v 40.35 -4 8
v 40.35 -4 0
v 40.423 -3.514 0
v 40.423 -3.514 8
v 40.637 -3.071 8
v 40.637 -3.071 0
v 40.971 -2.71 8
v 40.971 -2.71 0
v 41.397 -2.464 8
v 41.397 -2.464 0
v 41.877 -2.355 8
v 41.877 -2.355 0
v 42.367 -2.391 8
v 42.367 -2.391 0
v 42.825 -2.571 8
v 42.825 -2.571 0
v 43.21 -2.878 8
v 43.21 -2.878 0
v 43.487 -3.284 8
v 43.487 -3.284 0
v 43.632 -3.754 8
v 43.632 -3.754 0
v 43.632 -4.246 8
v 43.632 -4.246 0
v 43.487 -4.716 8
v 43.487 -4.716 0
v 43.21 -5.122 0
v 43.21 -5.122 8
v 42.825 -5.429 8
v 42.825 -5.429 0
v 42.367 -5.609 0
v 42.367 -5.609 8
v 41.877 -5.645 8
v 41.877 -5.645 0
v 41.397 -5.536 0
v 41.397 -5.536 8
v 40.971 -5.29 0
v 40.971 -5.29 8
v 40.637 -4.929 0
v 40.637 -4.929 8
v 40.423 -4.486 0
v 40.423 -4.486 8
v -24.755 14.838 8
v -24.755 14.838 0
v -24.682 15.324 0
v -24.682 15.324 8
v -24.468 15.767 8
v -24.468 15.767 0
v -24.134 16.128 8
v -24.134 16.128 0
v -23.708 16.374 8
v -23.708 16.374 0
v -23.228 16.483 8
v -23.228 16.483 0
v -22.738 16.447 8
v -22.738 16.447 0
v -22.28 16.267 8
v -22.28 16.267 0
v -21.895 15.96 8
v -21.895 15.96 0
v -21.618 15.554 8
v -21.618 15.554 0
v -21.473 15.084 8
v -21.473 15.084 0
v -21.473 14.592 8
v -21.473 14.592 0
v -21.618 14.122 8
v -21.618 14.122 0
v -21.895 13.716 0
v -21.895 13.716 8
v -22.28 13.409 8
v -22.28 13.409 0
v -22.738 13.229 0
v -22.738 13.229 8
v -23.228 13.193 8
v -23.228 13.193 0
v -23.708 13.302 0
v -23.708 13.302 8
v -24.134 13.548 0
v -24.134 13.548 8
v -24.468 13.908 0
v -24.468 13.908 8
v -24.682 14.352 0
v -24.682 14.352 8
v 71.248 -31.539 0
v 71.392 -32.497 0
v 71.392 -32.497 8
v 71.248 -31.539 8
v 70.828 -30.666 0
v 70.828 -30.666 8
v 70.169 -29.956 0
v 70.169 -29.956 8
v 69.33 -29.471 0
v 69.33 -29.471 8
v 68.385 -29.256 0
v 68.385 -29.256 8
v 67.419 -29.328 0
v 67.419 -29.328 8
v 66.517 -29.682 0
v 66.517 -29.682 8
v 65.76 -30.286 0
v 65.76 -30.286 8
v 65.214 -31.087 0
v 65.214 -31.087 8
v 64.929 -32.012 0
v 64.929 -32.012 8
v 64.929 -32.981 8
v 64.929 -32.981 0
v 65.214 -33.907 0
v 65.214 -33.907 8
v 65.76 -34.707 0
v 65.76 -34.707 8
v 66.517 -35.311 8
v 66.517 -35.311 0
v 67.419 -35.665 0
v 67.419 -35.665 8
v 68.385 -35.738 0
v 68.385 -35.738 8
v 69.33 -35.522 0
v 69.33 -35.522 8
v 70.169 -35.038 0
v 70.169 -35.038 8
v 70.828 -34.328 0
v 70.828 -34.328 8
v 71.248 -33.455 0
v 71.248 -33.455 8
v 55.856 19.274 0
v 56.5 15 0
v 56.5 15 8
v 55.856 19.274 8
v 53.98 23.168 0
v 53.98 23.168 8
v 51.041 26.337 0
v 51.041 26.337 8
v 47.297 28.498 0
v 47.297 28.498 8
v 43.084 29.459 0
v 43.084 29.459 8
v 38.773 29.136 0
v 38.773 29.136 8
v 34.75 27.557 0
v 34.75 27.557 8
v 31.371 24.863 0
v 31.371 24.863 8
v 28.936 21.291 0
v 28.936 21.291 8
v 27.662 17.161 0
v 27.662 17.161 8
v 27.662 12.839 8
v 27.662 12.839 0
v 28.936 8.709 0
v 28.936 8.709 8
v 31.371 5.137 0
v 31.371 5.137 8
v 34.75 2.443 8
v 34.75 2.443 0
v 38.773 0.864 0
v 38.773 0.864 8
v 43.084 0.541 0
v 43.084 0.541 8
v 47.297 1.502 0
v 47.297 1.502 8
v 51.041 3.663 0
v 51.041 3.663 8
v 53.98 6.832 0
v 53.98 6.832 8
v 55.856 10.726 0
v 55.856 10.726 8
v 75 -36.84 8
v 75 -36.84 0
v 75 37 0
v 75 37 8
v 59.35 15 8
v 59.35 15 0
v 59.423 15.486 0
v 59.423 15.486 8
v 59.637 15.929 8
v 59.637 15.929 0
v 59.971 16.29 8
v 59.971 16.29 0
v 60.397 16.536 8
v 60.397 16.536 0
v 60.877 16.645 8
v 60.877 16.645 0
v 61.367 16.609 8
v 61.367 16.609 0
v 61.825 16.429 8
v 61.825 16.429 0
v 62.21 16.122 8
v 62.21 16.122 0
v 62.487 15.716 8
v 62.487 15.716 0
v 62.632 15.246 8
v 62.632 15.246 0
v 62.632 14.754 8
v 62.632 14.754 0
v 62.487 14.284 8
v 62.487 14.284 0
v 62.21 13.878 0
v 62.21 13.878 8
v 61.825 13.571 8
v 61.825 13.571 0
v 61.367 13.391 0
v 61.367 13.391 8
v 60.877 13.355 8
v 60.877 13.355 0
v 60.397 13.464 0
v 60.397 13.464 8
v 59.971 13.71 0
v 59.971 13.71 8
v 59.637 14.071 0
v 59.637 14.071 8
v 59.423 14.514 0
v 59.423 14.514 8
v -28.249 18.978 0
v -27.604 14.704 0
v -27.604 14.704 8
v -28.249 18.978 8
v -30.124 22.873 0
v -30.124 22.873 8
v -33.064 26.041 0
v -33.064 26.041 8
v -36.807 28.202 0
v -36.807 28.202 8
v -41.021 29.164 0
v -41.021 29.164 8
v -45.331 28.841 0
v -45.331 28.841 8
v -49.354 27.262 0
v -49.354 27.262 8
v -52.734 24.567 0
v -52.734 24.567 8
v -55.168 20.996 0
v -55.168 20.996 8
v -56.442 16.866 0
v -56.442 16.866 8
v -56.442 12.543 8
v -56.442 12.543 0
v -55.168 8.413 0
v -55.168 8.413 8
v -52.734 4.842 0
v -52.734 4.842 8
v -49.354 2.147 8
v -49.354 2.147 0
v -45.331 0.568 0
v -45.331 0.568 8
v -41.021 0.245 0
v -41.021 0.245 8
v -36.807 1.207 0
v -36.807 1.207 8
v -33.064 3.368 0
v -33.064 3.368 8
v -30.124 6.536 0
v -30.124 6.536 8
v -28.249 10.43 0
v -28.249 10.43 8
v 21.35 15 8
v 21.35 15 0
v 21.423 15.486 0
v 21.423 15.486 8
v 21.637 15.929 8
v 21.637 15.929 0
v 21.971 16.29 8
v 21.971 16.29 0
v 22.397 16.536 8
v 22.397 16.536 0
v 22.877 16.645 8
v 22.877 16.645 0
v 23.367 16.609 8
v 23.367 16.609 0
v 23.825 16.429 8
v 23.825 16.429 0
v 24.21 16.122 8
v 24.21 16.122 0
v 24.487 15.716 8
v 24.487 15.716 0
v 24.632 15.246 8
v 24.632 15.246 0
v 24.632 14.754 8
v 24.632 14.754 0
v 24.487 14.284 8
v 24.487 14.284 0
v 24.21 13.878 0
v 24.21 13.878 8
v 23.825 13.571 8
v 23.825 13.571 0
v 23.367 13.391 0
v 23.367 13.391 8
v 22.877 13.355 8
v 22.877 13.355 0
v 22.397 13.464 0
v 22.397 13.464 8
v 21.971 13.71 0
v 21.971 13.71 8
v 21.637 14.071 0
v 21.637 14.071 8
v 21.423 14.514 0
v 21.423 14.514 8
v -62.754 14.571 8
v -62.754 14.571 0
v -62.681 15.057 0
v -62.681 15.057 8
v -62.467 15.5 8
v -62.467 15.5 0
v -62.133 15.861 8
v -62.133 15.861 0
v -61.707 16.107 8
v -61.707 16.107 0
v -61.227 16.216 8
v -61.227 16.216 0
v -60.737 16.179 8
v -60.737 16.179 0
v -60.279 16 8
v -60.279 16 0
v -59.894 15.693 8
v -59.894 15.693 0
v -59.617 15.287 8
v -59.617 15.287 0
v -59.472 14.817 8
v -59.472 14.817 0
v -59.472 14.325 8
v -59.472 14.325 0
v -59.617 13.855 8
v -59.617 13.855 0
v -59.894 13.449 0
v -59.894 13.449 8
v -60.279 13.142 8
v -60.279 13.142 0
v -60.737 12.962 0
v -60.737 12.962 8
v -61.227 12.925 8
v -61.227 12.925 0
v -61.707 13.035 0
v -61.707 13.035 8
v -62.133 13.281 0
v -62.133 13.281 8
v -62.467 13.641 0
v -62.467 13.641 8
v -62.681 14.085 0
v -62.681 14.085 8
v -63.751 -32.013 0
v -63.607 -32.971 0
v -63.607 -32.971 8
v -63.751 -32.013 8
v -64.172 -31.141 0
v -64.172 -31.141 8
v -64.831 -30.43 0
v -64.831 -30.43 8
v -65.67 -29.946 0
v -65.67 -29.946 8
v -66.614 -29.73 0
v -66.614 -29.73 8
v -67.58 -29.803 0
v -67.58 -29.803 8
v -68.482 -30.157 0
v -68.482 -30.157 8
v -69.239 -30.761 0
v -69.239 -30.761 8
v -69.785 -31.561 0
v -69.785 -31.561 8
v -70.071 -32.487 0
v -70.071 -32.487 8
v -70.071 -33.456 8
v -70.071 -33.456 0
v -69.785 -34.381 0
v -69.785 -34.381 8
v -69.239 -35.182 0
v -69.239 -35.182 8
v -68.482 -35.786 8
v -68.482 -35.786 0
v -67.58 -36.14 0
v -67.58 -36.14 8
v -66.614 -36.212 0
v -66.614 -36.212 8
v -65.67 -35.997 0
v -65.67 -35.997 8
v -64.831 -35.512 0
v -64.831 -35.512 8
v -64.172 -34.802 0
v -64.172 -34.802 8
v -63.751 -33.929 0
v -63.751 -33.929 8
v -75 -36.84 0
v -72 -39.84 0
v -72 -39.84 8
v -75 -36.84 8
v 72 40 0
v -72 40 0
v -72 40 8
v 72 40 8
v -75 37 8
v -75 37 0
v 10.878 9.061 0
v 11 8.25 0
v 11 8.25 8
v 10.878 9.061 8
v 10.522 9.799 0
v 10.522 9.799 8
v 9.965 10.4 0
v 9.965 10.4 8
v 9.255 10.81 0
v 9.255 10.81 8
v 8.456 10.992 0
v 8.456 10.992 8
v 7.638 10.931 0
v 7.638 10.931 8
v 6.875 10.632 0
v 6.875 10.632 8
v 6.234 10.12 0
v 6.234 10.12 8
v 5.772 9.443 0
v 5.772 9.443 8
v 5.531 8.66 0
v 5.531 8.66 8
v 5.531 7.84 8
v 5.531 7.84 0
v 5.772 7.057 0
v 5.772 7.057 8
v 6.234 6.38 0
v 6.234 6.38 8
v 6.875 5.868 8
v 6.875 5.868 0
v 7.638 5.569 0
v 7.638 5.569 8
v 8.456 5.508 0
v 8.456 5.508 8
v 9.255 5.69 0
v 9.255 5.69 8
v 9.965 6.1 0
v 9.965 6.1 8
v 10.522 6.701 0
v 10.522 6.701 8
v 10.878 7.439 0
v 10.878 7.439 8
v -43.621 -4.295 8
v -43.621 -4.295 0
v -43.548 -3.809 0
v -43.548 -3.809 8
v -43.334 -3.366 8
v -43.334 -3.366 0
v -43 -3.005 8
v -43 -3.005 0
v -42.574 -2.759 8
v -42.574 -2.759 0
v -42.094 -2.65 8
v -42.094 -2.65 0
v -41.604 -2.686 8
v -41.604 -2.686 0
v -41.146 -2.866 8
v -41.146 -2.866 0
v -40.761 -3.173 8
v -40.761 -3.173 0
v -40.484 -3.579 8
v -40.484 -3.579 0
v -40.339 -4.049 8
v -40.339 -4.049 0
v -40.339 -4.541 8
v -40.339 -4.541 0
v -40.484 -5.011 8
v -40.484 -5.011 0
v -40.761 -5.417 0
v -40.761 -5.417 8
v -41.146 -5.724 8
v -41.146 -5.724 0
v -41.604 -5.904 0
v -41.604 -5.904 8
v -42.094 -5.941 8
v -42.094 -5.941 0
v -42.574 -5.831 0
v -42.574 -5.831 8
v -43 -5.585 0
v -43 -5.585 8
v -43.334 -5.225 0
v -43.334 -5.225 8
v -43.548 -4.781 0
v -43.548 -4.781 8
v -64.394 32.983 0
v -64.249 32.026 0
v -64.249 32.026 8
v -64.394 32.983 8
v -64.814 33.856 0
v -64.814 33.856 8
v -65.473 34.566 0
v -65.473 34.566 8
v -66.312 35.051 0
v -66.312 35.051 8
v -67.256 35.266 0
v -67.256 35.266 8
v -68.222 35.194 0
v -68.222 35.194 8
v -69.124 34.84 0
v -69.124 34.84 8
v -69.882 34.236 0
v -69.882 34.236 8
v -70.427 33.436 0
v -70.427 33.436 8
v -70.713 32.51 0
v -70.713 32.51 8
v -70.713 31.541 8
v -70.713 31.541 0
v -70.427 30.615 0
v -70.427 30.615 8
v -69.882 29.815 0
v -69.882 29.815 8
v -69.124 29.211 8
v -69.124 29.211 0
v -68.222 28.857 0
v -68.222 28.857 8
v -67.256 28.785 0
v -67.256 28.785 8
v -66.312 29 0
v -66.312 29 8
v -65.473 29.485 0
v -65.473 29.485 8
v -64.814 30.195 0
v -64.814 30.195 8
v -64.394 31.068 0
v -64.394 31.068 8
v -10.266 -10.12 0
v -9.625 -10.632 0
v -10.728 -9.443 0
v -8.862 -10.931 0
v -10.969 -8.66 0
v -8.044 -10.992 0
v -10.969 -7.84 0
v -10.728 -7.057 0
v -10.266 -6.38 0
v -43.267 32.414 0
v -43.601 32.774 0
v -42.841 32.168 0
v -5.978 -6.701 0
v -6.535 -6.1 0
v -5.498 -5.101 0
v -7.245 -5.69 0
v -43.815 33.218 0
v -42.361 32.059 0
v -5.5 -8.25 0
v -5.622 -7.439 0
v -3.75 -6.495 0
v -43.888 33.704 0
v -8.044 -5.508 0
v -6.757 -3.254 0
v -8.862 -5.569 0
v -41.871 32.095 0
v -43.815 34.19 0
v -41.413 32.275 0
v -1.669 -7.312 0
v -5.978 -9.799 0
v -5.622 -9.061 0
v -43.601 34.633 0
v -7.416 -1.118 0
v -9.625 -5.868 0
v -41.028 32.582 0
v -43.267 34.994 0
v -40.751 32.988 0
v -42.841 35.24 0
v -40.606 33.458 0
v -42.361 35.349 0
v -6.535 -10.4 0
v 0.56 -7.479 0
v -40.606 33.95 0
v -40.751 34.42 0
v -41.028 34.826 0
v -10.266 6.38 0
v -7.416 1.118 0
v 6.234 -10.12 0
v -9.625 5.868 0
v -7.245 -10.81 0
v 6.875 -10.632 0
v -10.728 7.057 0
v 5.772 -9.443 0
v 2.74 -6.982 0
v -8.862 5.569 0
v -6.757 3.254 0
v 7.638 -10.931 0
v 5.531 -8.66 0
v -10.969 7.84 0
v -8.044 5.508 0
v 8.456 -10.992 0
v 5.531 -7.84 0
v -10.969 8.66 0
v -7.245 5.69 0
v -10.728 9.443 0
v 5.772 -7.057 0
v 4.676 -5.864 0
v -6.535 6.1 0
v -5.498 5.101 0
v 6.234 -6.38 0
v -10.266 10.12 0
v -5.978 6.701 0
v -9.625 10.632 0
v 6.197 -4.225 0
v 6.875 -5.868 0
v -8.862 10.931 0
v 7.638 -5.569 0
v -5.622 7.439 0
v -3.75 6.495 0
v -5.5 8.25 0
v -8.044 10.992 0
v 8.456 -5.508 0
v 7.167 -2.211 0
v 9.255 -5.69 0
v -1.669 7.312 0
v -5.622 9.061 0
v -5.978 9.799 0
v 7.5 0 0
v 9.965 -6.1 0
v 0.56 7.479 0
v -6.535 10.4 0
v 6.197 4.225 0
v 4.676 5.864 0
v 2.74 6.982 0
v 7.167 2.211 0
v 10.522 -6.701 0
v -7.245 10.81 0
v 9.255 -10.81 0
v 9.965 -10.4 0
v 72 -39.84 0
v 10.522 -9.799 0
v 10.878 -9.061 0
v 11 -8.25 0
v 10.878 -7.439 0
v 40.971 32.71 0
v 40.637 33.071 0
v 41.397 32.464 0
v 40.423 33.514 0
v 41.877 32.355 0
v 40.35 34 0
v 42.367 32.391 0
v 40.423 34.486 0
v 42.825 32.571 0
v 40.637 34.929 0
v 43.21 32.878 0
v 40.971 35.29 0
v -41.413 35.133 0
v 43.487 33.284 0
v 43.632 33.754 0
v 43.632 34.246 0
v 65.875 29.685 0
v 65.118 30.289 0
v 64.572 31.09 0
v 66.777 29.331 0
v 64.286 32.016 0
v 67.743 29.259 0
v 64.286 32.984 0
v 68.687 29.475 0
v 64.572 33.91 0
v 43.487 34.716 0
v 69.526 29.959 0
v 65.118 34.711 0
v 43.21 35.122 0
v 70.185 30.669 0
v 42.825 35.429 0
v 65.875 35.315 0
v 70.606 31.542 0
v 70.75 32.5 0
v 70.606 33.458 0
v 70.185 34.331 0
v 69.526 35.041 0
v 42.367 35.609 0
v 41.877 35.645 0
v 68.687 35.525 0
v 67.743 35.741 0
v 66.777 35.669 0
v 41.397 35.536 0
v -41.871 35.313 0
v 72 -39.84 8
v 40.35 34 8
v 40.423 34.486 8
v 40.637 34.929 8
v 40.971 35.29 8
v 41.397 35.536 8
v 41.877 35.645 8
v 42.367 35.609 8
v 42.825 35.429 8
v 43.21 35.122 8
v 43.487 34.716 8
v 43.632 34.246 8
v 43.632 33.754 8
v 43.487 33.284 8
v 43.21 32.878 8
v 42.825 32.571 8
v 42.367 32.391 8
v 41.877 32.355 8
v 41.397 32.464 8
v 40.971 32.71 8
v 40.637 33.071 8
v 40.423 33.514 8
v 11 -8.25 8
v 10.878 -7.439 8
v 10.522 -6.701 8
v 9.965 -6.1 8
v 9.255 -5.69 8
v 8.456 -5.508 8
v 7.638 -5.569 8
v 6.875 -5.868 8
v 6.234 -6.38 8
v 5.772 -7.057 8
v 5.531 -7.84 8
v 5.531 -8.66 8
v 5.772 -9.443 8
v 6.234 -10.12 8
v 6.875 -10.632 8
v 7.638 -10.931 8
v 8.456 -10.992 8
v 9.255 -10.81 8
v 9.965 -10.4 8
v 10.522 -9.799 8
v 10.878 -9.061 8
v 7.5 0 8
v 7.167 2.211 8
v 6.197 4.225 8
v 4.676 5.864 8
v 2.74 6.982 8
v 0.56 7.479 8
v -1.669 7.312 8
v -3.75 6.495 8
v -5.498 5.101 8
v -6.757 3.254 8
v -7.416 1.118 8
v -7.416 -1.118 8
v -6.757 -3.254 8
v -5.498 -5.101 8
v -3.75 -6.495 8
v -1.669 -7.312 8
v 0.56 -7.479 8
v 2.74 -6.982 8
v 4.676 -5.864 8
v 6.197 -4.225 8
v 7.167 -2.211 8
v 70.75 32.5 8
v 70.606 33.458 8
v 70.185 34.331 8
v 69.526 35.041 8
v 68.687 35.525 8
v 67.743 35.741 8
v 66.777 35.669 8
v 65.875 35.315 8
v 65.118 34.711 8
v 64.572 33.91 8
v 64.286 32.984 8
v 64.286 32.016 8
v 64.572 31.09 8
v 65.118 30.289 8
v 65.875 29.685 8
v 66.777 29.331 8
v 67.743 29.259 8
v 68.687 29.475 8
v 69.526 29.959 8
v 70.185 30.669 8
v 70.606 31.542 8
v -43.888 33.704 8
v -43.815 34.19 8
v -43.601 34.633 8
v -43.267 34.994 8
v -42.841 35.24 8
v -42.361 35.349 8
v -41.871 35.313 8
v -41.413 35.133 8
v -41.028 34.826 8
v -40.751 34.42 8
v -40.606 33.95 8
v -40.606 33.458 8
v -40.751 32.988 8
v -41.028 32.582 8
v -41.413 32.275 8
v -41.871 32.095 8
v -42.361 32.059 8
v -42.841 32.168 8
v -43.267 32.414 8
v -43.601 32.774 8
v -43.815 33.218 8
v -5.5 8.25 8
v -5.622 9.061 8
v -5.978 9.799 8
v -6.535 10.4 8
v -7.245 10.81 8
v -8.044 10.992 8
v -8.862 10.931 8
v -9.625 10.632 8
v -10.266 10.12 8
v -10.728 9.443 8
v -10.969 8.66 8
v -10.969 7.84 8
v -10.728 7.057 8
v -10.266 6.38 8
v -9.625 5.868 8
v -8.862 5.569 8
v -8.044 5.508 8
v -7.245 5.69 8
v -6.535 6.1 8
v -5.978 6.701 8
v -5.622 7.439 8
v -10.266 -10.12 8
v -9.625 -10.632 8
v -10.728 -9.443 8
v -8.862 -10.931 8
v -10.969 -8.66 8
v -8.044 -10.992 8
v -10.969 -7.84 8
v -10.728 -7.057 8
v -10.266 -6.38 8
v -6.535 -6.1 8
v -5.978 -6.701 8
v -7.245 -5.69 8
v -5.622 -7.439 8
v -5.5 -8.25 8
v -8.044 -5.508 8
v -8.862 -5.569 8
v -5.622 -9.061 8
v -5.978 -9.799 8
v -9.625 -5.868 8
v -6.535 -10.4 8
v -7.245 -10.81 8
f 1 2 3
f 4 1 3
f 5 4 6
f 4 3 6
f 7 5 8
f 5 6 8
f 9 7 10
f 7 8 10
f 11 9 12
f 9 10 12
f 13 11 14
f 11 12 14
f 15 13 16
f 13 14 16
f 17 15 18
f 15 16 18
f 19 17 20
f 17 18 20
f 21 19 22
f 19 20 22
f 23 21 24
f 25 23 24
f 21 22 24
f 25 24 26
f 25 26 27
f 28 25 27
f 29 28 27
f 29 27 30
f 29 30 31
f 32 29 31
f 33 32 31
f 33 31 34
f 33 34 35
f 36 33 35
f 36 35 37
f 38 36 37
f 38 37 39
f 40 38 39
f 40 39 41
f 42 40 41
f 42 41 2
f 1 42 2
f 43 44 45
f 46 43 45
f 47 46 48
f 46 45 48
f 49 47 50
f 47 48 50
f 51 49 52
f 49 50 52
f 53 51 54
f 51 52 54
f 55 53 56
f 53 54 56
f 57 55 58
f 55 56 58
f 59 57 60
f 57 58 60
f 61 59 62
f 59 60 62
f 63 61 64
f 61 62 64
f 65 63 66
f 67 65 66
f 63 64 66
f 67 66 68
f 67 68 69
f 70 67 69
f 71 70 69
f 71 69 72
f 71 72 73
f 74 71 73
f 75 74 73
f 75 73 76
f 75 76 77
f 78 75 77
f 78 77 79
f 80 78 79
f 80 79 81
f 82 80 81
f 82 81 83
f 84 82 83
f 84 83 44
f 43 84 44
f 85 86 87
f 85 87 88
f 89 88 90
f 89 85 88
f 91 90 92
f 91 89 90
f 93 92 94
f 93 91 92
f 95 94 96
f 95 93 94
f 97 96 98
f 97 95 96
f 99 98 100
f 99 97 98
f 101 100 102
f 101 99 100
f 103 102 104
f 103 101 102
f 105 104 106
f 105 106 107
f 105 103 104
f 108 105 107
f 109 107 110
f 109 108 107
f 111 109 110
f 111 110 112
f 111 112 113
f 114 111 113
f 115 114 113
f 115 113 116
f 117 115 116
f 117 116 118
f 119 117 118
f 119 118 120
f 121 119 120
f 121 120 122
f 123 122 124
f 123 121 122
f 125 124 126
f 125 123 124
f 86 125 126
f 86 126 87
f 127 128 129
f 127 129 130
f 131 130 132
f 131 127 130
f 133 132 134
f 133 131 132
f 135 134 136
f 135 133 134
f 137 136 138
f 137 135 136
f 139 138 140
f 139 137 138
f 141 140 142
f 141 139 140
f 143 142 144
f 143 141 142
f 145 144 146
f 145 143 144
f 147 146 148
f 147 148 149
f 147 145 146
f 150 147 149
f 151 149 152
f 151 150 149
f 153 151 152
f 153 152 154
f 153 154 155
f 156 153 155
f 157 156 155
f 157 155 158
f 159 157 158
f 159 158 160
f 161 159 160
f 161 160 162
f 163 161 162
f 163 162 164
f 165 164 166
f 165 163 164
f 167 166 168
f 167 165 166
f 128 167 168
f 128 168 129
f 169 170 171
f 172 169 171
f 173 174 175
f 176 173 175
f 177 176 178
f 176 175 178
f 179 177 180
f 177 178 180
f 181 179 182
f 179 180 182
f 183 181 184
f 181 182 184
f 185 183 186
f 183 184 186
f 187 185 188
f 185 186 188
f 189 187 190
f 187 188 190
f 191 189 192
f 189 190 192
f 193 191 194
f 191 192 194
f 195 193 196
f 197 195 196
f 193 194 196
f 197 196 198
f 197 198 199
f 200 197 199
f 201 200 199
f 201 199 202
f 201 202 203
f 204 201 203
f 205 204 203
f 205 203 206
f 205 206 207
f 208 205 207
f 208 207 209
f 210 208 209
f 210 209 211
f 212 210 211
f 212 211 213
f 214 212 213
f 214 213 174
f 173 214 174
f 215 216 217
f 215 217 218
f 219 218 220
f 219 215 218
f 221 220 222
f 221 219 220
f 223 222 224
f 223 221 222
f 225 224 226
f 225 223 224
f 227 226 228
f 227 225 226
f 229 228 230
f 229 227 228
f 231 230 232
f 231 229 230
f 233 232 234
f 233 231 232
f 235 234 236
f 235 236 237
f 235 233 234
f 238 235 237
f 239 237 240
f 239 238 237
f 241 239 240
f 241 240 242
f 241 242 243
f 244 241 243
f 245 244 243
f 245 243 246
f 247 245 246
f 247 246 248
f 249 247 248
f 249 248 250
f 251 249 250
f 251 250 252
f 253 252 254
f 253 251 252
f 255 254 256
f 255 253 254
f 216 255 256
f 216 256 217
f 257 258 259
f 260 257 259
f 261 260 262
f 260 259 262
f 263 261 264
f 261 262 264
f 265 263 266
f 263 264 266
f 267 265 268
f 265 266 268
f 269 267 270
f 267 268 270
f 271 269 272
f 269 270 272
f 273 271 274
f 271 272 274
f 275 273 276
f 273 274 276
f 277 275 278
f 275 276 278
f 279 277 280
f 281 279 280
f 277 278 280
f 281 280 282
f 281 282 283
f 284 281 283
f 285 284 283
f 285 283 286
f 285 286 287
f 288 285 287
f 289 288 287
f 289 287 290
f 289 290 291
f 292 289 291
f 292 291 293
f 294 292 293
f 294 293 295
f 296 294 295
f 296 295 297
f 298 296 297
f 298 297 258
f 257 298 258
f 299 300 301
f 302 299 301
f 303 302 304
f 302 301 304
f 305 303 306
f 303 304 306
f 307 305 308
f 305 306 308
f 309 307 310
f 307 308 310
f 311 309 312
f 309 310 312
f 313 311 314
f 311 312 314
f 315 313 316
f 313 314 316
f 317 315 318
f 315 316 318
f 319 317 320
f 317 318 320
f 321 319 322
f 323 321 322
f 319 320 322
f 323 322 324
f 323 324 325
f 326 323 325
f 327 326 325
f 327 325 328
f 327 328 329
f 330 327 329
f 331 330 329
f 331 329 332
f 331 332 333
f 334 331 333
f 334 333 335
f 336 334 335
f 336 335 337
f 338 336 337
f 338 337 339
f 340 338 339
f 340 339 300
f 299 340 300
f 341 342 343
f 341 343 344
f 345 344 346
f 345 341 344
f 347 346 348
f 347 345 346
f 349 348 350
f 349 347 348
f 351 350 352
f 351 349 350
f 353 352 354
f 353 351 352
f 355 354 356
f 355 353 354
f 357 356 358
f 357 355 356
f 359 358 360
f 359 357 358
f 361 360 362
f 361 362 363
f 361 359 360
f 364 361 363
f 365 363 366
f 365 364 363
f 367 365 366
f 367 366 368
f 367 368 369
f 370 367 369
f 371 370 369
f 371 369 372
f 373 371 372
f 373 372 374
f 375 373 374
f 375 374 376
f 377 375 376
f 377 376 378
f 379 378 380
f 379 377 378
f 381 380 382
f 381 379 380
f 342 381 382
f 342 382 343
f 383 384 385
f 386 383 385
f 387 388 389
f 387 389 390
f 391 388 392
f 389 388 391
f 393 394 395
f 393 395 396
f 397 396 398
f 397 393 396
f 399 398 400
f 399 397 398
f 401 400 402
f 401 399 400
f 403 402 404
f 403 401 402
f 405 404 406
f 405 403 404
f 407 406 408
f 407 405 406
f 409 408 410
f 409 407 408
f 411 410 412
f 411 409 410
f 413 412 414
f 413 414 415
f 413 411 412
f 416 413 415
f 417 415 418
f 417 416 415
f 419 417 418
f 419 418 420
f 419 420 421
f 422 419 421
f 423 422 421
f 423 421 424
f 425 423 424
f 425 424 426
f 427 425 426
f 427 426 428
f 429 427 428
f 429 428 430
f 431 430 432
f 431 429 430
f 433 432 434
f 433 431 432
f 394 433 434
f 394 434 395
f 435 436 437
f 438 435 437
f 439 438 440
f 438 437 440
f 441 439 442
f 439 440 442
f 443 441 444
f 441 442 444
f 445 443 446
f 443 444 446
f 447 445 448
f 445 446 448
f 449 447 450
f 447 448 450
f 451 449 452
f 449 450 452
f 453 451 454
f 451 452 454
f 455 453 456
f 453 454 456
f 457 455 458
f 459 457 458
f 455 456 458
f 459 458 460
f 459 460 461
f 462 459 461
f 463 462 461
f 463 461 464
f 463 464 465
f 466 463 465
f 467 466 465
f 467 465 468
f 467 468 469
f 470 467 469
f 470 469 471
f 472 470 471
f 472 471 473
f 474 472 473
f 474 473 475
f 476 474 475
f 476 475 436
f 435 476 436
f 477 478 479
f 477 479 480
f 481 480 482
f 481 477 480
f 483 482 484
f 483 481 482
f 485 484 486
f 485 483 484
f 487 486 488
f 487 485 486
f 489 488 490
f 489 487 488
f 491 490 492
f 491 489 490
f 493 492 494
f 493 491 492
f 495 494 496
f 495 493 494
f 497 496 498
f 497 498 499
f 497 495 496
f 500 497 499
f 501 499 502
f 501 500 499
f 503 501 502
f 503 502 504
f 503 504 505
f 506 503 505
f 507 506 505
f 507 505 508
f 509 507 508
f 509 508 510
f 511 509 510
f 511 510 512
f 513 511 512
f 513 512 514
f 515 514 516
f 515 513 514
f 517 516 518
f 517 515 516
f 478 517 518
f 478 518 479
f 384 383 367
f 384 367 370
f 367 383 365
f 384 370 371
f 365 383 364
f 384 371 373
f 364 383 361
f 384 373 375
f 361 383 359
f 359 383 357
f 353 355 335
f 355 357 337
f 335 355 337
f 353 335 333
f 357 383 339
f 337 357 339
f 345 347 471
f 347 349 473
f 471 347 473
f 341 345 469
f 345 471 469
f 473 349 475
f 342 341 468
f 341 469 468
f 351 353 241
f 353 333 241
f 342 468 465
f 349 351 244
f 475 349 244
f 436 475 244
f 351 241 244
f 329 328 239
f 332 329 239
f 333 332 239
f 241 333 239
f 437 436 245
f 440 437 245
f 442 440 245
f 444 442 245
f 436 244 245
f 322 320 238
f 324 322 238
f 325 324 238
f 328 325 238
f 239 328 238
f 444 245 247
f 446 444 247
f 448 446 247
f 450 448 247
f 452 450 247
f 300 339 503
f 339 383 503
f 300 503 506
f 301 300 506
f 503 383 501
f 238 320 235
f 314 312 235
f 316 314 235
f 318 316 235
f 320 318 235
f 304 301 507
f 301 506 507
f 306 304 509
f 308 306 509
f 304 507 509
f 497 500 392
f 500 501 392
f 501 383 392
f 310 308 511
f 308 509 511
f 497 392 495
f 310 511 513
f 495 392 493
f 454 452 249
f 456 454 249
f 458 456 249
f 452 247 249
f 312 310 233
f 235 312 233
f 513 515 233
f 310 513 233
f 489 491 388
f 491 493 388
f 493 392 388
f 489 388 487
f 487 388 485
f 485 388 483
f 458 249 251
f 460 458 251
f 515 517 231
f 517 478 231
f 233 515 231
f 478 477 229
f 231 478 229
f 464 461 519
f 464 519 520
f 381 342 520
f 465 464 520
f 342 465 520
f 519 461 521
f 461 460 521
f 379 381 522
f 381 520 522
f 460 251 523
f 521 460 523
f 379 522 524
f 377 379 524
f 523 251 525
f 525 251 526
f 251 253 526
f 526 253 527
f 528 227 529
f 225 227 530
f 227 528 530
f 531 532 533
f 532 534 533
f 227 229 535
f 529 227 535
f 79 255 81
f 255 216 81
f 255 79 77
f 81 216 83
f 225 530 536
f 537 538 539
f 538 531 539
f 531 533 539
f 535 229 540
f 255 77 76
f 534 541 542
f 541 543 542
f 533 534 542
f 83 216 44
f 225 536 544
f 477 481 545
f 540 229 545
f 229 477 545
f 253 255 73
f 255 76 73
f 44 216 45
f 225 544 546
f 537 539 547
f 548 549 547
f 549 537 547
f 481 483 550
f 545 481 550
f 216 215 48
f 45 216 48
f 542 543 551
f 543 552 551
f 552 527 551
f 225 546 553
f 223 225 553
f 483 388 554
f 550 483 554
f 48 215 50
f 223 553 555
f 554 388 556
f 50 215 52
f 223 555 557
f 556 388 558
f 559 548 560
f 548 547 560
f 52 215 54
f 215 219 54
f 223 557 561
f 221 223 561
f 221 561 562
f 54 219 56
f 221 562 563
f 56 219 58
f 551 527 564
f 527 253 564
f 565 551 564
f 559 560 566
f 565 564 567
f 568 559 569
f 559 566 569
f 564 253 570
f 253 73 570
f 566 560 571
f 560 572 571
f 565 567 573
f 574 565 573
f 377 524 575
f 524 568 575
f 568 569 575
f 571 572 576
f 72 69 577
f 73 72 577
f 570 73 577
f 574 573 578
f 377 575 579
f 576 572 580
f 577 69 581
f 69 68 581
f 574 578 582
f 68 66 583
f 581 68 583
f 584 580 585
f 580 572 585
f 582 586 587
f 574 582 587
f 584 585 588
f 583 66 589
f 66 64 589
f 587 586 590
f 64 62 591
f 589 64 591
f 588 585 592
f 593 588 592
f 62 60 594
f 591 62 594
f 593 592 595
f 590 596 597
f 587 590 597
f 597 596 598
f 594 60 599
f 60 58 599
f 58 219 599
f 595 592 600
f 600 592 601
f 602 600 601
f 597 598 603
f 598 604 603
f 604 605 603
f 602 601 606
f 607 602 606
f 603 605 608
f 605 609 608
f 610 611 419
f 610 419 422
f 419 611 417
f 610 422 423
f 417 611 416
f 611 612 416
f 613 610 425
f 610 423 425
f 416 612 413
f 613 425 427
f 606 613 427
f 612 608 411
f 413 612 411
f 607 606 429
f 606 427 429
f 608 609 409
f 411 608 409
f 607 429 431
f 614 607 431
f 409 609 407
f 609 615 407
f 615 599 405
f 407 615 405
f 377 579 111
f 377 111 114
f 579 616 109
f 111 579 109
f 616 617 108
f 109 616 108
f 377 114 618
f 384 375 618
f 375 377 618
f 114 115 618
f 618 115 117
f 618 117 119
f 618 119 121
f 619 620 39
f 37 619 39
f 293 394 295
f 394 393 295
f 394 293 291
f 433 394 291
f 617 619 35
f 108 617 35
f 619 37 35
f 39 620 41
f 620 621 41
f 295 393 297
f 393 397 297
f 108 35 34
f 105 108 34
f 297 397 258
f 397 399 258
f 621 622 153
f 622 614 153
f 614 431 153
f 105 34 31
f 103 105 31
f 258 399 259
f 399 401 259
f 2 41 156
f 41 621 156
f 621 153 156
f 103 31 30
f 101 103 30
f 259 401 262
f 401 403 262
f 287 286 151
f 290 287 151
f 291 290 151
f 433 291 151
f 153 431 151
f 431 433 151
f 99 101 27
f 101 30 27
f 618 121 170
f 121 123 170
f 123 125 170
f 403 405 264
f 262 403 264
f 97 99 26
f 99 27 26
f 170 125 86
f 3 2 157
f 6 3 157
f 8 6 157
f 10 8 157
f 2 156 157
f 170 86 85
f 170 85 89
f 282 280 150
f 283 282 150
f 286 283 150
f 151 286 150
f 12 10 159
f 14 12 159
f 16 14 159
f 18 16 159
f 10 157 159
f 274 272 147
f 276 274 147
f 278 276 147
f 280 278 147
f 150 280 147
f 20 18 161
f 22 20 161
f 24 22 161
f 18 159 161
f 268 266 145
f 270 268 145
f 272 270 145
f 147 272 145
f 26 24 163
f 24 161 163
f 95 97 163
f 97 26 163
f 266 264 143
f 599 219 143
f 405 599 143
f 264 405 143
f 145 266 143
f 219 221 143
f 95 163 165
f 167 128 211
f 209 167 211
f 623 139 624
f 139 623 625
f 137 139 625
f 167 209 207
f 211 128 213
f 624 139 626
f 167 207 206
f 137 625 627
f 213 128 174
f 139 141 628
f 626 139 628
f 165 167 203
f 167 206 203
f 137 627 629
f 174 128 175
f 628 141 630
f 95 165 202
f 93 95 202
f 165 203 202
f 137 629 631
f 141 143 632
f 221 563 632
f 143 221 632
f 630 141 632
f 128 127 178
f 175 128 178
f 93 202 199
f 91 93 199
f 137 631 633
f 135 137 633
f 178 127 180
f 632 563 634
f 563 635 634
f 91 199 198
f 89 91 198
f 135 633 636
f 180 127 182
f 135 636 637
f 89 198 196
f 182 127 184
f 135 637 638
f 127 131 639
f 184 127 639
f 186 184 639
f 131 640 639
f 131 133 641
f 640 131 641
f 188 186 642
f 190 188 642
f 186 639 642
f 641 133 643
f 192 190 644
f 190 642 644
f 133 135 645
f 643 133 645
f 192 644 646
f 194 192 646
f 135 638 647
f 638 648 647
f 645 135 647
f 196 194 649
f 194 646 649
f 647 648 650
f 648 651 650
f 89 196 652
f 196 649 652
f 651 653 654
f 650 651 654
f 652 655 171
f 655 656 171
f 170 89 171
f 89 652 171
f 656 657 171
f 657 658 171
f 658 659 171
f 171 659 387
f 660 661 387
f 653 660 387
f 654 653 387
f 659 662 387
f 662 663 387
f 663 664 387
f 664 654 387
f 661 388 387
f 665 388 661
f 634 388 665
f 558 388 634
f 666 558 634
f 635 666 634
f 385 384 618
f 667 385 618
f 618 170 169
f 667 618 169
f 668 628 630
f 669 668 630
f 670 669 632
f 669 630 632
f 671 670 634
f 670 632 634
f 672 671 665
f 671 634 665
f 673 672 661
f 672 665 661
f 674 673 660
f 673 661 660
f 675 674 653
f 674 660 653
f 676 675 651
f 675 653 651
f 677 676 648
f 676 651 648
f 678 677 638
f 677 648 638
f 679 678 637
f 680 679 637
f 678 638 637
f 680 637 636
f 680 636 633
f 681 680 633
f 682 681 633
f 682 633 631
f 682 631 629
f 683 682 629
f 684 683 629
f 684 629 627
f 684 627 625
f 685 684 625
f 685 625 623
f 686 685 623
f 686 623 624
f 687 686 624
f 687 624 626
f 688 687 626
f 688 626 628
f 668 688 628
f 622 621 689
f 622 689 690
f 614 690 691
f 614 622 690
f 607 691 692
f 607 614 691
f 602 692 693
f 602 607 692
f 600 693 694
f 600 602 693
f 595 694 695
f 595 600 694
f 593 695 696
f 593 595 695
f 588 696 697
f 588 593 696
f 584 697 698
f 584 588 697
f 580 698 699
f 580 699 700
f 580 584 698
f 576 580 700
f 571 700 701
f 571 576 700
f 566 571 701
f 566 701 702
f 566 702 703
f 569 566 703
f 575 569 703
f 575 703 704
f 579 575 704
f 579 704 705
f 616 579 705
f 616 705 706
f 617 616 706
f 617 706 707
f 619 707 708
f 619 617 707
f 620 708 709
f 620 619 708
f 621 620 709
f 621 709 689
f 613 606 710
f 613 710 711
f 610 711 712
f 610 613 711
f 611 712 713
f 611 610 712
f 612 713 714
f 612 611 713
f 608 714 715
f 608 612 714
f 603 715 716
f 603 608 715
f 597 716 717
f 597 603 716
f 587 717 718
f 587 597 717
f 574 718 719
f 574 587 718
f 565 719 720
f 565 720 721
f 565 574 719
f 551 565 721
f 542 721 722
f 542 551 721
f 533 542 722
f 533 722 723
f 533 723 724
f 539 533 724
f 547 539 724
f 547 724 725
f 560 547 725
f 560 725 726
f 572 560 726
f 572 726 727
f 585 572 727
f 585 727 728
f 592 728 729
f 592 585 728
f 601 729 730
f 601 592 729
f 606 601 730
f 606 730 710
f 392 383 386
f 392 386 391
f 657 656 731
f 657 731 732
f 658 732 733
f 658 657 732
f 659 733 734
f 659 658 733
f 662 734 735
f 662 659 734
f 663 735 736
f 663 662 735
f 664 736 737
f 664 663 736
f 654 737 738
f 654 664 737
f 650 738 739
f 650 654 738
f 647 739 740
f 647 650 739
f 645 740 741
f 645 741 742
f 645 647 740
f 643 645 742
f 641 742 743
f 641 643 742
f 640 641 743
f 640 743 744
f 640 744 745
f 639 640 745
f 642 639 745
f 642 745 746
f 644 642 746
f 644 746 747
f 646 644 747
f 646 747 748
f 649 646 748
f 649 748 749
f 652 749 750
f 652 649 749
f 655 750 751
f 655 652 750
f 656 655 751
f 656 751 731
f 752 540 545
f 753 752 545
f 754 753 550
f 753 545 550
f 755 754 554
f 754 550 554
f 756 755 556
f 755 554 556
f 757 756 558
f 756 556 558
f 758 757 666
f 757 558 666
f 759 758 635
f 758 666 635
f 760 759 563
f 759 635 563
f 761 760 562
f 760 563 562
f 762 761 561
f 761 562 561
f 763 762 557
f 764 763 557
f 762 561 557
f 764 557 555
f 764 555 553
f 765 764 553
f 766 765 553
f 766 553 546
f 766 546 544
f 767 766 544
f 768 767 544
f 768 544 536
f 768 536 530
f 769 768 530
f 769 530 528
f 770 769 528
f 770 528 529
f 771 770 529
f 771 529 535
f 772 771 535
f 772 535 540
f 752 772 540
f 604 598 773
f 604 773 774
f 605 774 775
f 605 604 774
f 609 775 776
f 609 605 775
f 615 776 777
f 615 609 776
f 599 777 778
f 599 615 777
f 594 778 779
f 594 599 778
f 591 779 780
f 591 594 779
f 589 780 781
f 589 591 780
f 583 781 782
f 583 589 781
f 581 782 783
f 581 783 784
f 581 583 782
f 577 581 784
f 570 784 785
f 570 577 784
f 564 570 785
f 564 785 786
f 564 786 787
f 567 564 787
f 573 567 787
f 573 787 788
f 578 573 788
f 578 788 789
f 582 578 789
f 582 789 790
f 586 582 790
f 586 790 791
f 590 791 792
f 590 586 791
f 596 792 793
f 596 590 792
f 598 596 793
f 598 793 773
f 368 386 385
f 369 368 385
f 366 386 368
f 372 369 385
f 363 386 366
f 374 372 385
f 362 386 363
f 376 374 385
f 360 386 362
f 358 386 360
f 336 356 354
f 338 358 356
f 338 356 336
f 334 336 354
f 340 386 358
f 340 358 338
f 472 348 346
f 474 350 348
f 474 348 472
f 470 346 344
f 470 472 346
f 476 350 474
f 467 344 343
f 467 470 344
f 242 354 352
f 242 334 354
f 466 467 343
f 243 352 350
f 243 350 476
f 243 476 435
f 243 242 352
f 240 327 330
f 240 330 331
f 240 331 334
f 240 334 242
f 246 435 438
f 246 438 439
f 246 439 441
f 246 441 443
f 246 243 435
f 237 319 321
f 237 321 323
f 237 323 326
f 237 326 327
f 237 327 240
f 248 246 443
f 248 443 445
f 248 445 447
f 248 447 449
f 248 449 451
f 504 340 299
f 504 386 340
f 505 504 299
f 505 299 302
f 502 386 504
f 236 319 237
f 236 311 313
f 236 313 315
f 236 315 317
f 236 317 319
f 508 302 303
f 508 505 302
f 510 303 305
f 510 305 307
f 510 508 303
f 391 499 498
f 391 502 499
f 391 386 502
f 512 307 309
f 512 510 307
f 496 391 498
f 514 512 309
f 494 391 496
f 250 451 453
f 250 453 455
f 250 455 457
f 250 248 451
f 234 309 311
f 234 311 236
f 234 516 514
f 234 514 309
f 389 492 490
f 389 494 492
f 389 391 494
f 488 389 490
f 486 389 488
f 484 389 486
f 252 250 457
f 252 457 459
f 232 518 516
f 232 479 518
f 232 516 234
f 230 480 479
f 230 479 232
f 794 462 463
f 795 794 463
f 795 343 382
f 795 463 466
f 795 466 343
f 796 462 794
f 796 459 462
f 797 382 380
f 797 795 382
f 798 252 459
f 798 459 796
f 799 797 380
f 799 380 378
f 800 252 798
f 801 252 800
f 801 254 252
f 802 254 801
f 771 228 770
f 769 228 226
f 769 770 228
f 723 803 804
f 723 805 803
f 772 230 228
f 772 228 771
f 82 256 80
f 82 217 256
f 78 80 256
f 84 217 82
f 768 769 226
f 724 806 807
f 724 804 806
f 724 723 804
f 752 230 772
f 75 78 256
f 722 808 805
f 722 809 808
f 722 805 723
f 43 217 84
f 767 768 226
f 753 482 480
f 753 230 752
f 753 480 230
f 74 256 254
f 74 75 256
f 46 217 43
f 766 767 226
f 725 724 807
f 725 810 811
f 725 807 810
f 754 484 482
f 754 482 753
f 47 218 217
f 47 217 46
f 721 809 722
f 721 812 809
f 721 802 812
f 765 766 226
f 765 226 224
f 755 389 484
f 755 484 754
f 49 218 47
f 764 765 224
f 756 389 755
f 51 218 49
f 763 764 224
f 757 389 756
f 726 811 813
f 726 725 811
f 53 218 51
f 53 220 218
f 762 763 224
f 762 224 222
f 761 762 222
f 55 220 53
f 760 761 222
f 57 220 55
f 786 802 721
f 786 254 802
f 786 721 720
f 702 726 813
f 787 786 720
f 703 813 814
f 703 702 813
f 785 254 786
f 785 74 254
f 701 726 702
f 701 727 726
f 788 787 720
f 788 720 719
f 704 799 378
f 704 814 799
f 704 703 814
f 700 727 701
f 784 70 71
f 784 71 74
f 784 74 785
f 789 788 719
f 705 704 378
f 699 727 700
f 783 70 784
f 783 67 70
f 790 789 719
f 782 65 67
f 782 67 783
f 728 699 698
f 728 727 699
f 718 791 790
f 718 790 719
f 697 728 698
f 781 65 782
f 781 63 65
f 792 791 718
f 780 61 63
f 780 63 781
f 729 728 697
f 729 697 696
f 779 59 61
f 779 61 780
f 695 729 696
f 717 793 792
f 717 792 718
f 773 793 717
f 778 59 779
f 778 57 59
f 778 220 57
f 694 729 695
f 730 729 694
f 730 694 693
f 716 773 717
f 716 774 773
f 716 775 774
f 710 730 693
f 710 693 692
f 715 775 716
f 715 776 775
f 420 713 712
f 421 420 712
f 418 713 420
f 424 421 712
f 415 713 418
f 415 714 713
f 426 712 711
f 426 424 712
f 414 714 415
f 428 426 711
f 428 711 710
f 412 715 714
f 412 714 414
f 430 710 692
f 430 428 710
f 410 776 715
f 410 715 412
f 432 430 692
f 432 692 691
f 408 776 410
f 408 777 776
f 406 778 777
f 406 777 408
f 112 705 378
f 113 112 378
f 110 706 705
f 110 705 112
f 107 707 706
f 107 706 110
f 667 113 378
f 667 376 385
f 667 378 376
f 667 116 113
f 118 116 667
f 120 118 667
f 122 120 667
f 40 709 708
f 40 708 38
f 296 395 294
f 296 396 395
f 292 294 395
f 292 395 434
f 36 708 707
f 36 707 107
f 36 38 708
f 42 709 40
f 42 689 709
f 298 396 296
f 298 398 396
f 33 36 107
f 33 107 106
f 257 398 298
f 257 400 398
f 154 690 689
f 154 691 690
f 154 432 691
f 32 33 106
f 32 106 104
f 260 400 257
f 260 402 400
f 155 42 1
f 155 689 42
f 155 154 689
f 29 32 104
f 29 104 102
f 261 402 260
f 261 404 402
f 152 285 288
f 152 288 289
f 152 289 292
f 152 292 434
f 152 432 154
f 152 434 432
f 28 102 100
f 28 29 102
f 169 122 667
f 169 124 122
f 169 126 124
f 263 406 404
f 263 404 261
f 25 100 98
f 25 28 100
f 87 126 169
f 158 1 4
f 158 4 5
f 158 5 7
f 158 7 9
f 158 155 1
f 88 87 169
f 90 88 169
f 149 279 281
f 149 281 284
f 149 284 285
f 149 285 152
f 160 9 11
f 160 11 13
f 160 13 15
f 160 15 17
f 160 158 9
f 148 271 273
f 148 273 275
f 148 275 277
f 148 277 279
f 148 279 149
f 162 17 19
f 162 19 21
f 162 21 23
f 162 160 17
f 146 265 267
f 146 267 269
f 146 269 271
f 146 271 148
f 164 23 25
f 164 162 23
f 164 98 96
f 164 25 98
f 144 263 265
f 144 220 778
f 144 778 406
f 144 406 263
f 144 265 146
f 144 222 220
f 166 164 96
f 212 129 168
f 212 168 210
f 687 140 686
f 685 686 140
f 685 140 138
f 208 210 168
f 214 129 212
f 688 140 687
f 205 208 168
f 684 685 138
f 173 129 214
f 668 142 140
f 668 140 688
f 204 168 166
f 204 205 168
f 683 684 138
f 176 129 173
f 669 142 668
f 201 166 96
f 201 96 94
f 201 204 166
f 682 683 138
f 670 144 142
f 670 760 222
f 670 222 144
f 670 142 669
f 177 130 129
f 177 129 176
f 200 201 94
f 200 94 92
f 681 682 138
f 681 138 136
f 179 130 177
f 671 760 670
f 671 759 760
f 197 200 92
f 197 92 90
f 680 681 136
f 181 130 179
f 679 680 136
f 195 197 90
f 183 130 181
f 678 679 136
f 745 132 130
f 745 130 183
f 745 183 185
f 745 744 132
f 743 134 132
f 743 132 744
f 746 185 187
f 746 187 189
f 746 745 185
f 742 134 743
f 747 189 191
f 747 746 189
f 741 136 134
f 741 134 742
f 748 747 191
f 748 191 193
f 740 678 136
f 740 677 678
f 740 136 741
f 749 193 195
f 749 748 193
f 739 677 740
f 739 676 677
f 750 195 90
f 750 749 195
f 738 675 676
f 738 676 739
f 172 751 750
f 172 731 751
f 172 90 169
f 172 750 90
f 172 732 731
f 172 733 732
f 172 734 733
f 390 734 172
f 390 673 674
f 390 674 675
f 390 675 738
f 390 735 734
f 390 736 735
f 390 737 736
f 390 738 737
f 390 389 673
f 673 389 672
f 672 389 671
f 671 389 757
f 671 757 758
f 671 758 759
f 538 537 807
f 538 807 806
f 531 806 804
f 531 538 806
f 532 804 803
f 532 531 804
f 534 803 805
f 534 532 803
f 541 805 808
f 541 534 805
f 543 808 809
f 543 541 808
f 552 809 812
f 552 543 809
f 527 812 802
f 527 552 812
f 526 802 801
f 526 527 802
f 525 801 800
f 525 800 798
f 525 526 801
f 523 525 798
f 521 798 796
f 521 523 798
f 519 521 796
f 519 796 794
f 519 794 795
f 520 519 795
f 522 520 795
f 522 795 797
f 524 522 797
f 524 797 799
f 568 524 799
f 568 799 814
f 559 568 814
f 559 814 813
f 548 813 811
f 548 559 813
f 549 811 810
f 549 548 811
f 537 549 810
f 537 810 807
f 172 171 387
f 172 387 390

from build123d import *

# Parameters (mm, degrees)
F0_W     = 150
F0_H     = 79.84
F0_R     = 3.25
F0_R_2   = 1
F0_R_3   = 2.75
F0_R_4   = 7.5
F0_R_5   = 14.5
F1_DEPTH = 8
F2_SIZE  = 3
F4_D     = 3.3


with BuildPart() as f1:
    # F0 (on Top) → F1 (new body)
    with BuildSketch(Plane.XY):
        with Locations((0, 0.08)):
            Rectangle(F0_W, F0_H)
        with Locations((-66.8569050639, -32.9713009074)):
            Circle(F0_R, mode=Mode.SUBTRACT)
        with Locations((-41.9708455764, -4.2951276581)):
            Circle(F0_R_2, mode=Mode.SUBTRACT)
        with Locations((-8.25, -8.25)):
            Circle(F0_R_3, mode=Mode.SUBTRACT)
        with Locations((68.1422611349, -32.4968268505)):
            Circle(F0_R, mode=Mode.SUBTRACT)
        with Locations((8.25, -8.25)):
            Circle(F0_R_3, mode=Mode.SUBTRACT)
        Circle(F0_R_4, mode=Mode.SUBTRACT)
        with Locations((42, -4)):
            Circle(F0_R_2, mode=Mode.SUBTRACT)
        with Locations((-61.1039310143, 14.5708481086)):
            Circle(F0_R_2, mode=Mode.SUBTRACT)
        with Locations((-42.104400412, 14.7044029442)):
            Circle(F0_R_5, mode=Mode.SUBTRACT)
        with Locations((-8.25, 8.25)):
            Circle(F0_R_3, mode=Mode.SUBTRACT)
        with Locations((-23.1048698098, 14.8379577797)):
            Circle(F0_R_2, mode=Mode.SUBTRACT)
        with Locations((-67.4991661988, 32.0255259431)):
            Circle(F0_R, mode=Mode.SUBTRACT)
        with Locations((-42.2379552476, 33.7039335464)):
            Circle(F0_R_2, mode=Mode.SUBTRACT)
        with Locations((8.25, 8.25)):
            Circle(F0_R_3, mode=Mode.SUBTRACT)
        with Locations((23, 15)):
            Circle(F0_R_2, mode=Mode.SUBTRACT)
        with Locations((42, 15)):
            Circle(F0_R_5, mode=Mode.SUBTRACT)
        with Locations((61, 15)):
            Circle(F0_R_2, mode=Mode.SUBTRACT)
        with Locations((42, 34)):
            Circle(F0_R_2, mode=Mode.SUBTRACT)
        with Locations((67.5, 32.5)):
            Circle(F0_R, mode=Mode.SUBTRACT)
    extrude(amount=F1_DEPTH)

    # F2
    f2_edges = [f1.edges().sort_by_distance(p)[0] for p in [
        (75, -39.84, 4),
        (75, 40, 4),
        (-75, -39.84, 4),
        (-75, 40, 4),
    ]]
    chamfer(f2_edges, length=F2_SIZE)

    # F4 (through all)
    with Locations(Plane.XY.offset(8)):
        with Locations((42, 34), (61, 15), (42, -4), (23, 15), (-23.1048698098, 14.8379577797), (-42.2379552476, 33.7039335464), (-41.9708455764, -4.2951276581), (-61.1039310143, 14.5708481086)):
            Hole(F4_D / 2)


solid = f1.part
